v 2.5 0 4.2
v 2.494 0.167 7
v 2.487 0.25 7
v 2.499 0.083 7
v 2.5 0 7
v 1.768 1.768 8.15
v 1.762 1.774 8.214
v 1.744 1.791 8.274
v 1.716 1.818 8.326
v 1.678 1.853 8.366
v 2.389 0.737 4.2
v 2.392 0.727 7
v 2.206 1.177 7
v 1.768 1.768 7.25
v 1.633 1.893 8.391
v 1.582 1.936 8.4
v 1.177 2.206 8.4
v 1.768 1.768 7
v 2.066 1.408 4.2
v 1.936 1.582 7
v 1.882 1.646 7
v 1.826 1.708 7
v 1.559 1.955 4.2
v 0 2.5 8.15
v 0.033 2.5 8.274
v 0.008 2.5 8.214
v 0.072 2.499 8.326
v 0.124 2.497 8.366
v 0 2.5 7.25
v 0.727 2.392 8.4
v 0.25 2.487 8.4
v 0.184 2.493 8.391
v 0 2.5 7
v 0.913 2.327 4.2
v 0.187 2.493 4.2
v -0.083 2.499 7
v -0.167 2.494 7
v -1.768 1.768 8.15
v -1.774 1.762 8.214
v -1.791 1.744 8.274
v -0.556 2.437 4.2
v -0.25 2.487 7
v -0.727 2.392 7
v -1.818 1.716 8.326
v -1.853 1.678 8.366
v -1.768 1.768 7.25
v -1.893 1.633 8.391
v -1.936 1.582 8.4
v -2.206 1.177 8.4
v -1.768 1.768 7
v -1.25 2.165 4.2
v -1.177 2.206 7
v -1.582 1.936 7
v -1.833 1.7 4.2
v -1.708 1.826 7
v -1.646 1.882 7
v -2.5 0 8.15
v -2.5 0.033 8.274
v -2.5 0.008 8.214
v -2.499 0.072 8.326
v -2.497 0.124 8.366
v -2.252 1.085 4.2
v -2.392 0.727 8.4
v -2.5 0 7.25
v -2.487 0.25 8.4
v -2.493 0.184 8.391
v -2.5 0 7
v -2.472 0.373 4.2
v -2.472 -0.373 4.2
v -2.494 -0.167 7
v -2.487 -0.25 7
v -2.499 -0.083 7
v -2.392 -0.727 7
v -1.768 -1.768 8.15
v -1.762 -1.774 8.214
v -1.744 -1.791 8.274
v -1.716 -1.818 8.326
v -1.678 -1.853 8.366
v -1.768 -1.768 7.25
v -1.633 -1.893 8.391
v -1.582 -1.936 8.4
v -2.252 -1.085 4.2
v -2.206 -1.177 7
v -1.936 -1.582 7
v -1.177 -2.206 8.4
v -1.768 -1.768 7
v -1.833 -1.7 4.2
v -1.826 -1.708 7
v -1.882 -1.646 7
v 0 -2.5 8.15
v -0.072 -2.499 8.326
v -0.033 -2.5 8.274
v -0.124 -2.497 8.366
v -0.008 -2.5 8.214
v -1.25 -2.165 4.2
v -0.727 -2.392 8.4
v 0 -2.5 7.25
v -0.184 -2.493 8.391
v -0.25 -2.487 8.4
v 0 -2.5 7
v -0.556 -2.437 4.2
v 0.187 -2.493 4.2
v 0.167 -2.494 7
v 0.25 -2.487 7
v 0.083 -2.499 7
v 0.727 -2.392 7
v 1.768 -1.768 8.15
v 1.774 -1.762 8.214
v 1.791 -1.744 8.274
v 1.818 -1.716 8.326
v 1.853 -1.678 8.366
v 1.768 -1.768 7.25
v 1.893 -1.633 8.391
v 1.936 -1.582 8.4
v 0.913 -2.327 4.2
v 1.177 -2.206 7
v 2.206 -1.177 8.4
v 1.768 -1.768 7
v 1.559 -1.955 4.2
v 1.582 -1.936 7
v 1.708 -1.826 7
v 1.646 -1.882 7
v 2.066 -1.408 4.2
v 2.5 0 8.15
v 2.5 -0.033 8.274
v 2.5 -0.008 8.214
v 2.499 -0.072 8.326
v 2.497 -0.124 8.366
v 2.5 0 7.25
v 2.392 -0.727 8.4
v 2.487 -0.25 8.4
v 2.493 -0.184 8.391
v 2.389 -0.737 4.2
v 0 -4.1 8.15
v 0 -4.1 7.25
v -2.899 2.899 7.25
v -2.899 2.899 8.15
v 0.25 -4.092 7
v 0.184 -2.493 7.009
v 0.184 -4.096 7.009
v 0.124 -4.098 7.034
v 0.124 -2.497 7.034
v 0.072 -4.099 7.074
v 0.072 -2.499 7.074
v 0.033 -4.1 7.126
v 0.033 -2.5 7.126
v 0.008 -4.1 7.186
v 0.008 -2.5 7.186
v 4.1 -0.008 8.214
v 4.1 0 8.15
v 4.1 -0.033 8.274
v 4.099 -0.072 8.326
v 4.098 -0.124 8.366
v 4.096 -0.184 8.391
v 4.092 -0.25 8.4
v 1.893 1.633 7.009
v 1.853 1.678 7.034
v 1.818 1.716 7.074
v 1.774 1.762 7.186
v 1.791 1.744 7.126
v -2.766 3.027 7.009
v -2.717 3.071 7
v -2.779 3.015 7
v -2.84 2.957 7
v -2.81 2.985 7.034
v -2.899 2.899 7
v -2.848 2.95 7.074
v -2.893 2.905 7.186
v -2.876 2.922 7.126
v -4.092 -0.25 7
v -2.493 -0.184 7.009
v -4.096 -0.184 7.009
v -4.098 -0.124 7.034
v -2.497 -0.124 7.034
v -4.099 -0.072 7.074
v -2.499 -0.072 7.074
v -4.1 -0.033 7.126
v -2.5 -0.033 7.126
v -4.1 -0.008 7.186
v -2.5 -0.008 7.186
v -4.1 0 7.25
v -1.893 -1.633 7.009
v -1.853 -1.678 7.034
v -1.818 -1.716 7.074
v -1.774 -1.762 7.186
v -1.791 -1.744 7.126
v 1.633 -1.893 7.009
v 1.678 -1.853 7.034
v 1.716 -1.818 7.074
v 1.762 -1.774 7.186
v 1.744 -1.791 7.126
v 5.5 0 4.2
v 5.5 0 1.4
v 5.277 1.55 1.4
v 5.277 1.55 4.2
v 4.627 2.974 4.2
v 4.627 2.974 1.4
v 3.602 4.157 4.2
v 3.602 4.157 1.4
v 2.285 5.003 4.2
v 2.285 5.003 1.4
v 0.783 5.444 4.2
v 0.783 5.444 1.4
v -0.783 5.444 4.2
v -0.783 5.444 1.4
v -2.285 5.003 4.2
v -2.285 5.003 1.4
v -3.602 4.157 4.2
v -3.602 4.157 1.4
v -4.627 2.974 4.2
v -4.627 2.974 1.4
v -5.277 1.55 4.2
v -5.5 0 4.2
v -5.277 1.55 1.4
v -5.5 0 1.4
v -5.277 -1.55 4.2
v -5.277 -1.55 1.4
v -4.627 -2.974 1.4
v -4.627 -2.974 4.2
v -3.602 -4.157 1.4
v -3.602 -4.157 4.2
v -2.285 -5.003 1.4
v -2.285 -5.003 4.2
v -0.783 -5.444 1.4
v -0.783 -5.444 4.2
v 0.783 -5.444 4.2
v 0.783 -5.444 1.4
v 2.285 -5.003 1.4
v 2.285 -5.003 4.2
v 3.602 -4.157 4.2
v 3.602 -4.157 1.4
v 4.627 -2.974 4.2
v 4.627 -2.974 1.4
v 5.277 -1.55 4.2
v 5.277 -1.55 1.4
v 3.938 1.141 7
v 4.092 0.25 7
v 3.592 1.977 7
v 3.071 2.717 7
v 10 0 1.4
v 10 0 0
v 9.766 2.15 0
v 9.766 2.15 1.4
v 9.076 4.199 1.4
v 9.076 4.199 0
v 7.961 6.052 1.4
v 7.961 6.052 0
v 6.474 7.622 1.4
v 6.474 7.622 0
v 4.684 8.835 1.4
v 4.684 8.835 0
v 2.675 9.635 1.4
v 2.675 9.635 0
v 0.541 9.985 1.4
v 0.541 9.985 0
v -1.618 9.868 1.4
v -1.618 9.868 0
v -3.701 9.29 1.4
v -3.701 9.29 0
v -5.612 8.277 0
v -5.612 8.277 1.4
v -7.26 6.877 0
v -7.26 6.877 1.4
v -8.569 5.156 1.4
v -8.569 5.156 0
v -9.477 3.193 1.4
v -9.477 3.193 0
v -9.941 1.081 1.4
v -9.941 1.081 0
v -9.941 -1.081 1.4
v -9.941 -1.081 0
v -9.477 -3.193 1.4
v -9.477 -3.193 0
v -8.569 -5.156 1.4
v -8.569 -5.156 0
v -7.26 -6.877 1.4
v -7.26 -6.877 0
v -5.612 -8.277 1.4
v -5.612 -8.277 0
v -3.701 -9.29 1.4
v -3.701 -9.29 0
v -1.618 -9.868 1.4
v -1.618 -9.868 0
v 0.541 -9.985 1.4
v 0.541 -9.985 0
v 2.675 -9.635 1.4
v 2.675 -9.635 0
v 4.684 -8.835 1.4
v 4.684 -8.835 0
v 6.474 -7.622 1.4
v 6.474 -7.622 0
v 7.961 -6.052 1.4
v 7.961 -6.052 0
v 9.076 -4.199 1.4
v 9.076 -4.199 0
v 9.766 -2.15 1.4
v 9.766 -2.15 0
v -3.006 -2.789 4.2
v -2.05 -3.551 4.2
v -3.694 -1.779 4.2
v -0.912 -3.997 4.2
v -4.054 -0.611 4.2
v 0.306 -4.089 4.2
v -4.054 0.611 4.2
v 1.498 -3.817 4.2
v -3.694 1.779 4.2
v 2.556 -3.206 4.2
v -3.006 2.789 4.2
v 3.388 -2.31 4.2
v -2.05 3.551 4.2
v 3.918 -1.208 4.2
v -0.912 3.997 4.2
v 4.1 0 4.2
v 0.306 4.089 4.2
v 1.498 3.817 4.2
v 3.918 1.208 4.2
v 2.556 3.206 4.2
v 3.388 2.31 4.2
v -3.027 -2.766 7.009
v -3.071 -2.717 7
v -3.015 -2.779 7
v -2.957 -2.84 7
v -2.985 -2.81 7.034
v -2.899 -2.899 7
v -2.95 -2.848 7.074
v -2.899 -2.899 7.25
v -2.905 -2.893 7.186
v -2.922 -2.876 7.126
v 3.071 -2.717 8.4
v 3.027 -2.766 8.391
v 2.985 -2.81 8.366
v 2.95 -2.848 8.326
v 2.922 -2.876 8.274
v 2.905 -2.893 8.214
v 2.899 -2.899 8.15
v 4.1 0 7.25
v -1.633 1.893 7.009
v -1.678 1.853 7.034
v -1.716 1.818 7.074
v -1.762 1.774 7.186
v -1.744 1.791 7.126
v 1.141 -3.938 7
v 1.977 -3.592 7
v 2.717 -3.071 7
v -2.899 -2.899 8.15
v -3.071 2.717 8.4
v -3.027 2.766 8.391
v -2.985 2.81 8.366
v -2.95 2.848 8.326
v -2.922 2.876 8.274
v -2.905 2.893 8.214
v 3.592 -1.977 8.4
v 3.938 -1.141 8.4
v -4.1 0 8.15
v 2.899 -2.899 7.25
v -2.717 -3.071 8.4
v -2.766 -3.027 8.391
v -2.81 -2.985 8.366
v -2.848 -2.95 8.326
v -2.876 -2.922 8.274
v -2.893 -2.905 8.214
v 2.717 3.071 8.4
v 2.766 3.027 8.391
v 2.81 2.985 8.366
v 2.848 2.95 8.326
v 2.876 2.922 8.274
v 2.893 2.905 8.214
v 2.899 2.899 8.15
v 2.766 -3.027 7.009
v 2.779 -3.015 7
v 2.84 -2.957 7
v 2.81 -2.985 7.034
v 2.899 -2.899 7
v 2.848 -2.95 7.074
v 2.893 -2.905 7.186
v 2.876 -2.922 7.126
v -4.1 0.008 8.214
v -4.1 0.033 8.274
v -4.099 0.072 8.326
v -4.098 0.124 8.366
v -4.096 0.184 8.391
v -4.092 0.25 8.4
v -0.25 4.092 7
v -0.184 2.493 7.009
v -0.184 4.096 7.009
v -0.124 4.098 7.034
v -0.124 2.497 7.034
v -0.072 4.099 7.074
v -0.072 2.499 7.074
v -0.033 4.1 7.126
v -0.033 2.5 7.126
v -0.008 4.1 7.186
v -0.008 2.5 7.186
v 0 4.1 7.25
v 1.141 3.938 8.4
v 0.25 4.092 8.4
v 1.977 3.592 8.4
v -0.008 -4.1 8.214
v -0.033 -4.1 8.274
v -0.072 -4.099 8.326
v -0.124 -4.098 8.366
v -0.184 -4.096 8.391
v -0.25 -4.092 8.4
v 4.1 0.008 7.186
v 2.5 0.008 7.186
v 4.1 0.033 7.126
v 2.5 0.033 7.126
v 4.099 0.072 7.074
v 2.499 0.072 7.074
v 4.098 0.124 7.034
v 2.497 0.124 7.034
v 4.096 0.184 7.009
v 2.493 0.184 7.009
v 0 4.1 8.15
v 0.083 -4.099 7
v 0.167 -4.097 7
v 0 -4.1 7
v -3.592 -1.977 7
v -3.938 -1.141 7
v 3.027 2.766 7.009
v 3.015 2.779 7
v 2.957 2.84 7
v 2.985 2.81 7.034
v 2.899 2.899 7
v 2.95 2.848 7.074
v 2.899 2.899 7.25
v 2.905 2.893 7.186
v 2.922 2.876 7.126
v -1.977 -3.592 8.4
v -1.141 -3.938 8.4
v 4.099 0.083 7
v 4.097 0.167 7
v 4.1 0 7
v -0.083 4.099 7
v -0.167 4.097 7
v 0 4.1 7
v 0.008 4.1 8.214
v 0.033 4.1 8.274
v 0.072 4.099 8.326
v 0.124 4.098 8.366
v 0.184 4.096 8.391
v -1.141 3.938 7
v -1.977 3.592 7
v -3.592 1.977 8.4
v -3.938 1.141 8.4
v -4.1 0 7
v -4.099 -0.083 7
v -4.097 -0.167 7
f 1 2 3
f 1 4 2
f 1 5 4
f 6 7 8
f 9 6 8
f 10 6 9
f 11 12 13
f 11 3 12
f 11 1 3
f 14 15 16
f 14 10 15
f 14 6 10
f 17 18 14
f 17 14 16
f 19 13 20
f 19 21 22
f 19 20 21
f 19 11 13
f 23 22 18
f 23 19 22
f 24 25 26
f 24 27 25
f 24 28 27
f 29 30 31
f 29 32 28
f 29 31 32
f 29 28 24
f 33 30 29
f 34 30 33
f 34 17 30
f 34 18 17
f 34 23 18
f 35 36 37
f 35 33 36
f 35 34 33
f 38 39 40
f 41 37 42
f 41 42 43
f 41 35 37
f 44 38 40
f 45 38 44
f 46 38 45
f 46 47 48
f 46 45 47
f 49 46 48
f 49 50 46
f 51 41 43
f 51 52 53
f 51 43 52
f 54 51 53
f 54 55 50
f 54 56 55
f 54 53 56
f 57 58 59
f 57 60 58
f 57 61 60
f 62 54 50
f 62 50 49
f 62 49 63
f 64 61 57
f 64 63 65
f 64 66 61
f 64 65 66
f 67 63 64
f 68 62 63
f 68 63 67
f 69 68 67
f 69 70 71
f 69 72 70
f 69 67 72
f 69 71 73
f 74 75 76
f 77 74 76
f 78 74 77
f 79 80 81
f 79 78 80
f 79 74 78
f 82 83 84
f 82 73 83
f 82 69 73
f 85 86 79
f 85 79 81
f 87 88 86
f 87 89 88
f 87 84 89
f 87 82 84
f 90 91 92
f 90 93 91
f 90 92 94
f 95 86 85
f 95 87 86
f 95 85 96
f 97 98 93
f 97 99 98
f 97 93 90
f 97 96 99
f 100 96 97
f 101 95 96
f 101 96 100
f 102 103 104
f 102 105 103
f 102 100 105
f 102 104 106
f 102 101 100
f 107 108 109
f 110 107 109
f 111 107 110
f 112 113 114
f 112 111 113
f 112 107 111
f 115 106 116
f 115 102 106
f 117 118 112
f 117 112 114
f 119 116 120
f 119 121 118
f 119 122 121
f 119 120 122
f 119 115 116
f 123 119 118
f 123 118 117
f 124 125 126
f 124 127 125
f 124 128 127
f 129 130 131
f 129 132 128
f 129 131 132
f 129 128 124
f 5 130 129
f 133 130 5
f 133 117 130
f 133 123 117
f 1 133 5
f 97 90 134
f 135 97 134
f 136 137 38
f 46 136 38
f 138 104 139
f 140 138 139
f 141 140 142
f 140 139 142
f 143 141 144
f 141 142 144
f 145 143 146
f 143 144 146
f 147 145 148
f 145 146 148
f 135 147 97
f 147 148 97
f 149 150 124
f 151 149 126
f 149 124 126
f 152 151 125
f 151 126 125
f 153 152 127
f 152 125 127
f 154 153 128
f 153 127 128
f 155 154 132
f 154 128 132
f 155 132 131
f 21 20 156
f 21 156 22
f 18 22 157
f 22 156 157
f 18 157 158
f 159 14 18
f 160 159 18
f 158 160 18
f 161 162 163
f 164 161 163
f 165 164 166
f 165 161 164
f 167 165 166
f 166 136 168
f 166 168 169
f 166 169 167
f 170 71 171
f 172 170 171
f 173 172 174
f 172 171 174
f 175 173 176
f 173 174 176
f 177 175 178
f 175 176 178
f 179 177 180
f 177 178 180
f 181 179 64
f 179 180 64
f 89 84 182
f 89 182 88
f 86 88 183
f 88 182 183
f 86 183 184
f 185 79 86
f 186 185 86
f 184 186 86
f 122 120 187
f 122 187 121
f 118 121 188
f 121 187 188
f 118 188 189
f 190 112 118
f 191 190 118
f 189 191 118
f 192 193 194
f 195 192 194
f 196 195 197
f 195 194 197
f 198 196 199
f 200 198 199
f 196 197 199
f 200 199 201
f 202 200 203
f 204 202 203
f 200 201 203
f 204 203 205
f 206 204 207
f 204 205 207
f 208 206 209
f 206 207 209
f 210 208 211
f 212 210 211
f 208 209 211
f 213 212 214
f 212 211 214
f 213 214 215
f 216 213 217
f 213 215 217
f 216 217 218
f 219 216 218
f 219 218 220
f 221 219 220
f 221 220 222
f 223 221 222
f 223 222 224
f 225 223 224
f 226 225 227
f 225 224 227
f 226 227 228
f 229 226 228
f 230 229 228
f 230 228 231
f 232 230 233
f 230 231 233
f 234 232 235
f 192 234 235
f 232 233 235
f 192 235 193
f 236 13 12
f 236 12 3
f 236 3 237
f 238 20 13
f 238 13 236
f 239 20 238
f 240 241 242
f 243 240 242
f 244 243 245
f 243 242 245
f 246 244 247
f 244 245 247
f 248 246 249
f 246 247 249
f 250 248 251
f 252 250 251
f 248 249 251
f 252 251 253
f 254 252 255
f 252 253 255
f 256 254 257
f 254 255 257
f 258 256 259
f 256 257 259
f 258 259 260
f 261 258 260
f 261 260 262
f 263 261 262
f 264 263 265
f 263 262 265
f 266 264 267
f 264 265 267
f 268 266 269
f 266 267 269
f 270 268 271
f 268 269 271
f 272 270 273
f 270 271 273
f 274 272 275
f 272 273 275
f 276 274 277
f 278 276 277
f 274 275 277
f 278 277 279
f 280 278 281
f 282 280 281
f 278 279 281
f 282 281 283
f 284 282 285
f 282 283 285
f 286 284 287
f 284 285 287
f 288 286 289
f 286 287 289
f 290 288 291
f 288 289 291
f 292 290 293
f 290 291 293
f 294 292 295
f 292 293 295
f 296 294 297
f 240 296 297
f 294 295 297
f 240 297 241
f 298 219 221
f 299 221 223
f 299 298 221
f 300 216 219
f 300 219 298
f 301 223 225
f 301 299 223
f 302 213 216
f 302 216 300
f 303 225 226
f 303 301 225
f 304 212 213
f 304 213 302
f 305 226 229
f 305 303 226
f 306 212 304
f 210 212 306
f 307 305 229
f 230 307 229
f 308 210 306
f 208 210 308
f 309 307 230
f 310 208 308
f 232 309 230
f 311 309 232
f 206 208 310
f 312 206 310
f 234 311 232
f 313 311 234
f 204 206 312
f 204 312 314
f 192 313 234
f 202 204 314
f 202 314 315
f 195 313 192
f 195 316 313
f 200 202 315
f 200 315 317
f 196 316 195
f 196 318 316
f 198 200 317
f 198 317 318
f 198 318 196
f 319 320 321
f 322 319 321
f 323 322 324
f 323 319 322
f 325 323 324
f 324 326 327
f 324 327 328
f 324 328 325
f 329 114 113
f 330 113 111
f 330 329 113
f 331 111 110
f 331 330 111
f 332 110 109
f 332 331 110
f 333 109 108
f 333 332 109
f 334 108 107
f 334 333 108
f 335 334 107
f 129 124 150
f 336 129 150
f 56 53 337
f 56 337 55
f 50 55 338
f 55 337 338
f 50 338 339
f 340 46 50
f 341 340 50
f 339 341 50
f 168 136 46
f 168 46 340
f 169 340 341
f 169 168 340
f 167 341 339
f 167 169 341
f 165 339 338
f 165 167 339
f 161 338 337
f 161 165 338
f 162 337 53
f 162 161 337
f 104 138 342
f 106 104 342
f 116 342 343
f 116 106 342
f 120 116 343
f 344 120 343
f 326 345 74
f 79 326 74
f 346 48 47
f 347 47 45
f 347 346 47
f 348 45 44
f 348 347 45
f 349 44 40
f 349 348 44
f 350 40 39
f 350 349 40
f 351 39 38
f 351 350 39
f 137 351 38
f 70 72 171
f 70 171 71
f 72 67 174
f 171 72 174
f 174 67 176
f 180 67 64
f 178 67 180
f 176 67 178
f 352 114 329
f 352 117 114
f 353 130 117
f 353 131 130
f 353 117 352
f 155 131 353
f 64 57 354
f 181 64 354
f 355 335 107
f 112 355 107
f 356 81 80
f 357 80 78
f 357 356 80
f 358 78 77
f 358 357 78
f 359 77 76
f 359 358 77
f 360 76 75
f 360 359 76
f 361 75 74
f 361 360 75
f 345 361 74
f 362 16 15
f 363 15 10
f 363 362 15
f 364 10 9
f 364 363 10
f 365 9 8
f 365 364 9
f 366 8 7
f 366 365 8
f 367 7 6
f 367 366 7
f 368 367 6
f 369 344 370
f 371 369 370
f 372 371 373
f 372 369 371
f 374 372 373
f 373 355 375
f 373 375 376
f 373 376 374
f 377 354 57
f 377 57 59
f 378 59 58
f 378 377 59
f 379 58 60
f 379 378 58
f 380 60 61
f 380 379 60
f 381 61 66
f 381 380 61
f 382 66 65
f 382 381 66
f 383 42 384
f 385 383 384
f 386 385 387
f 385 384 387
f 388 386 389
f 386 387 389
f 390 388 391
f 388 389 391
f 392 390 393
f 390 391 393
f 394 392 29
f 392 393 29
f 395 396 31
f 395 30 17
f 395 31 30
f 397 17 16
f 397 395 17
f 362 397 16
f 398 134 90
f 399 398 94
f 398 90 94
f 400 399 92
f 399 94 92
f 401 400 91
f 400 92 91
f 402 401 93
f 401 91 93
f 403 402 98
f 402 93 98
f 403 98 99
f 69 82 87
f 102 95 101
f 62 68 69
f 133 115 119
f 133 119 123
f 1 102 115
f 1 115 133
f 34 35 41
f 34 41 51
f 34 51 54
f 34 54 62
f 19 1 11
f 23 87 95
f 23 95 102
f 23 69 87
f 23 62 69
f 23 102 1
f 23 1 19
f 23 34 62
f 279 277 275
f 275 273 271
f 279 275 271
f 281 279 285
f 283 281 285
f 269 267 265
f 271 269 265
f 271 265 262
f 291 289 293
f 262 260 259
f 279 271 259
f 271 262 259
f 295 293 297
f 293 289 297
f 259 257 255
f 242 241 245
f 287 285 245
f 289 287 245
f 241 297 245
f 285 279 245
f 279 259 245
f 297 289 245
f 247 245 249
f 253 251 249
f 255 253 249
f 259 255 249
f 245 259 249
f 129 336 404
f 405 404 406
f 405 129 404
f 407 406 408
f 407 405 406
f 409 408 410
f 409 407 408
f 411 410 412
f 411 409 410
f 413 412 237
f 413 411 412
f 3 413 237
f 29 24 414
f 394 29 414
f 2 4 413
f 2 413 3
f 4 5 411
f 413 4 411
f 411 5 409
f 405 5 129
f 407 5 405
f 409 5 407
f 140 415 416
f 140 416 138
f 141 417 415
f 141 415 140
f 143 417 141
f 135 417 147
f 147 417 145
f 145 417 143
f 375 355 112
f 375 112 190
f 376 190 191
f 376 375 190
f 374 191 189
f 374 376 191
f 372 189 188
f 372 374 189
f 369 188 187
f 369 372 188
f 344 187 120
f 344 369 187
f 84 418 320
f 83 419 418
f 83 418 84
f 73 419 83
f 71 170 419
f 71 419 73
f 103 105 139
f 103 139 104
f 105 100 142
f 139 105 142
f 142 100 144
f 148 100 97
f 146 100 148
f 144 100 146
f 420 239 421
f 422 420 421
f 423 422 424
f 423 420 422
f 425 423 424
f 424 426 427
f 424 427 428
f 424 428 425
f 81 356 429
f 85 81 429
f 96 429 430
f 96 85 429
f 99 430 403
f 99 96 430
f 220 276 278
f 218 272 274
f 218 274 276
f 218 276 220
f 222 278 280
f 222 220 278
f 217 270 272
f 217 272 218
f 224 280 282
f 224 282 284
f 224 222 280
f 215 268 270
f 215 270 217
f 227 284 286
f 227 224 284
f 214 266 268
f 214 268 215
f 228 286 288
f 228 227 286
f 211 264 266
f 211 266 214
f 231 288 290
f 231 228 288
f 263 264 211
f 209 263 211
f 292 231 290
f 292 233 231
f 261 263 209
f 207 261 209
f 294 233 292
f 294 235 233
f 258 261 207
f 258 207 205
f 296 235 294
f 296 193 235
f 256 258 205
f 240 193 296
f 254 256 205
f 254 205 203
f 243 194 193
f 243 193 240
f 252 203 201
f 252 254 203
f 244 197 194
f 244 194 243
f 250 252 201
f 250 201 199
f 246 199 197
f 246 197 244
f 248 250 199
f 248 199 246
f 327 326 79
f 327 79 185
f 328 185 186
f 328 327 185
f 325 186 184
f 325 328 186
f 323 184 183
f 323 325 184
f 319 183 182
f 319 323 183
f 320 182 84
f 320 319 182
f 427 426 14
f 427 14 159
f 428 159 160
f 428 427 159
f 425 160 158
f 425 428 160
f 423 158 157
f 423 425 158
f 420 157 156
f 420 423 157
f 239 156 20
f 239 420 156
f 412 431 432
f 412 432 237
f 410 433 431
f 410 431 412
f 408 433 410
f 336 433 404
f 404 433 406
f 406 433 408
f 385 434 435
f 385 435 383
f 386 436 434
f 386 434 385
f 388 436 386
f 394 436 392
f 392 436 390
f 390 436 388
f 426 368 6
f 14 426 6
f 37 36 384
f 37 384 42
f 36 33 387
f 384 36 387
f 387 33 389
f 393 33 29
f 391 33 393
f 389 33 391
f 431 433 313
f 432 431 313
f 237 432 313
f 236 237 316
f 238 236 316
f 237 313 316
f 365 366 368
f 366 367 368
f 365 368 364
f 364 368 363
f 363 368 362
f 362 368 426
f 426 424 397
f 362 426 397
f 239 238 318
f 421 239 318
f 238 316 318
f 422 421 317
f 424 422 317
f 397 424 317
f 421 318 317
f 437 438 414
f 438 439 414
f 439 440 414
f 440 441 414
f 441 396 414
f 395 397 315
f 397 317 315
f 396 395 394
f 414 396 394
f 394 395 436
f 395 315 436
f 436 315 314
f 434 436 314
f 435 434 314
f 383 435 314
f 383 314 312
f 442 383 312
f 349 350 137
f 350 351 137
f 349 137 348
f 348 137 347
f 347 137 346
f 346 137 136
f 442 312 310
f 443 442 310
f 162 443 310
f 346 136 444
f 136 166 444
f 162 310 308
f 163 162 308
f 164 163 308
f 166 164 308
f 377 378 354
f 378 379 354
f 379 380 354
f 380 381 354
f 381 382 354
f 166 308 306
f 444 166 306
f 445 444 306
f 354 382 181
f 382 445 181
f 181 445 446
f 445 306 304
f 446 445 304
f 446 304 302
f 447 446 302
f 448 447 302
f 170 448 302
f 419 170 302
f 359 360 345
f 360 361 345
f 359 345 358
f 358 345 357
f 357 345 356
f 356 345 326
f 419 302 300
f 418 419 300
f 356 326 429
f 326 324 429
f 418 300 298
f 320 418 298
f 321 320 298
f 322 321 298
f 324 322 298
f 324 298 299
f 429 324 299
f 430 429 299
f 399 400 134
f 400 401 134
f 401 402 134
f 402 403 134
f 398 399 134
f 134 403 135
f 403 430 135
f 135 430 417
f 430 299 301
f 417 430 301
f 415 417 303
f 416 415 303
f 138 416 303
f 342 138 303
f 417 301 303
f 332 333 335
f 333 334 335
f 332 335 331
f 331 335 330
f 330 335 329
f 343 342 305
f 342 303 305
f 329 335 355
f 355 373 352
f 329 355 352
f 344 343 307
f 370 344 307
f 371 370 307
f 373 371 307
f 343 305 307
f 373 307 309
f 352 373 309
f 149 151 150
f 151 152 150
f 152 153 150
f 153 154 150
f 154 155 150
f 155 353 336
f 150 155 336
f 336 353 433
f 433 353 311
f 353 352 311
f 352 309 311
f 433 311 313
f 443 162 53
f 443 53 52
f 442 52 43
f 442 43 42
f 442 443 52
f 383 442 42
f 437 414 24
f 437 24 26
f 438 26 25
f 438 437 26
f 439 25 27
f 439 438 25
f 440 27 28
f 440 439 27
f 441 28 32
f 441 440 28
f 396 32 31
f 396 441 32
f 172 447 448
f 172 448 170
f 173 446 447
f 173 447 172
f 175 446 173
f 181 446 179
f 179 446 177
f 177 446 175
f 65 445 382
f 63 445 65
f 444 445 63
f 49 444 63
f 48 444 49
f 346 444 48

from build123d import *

# Parameters (mm, degrees)
F0_R         = 10
F1_DEPTH     = 1.4
F2_R         = 5.5
F3_DEPTH     = 2.8
F4_R         = 4.1
F4_R_2       = 2.5
F5_DEPTH     = 4.2
F7_DEPTH     = 1.4
F8_T4_DEPTH  = 2.85
F8_S5_R      = 4.1
F8_T6_DEPTH  = 3
F8_S7_R      = 2.5
F8_T8_DEPTH  = 3
F8_T12_DEPTH = 2.85
F8_S13_R     = 4.1
F8_T14_DEPTH = 3
F8_S15_R     = 2.5
F8_T16_DEPTH = 3
F8_T20_DEPTH = 2.85
F8_S21_R     = 4.1
F8_T22_DEPTH = 3
F8_S23_R     = 2.5
F8_T24_DEPTH = 3
F8_T28_DEPTH = 2.85
F8_S29_R     = 4.1
F8_T30_DEPTH = 3
F8_S31_R     = 2.5
F8_T32_DEPTH = 3
F8_T36_DEPTH = 2.85
F8_S37_R     = 4.1
F8_T38_DEPTH = 3
F8_S39_R     = 2.5
F8_T40_DEPTH = 3
F8_T44_DEPTH = 2.85
F8_S45_R     = 4.1
F8_T46_DEPTH = 3
F8_S47_R     = 2.5
F8_T48_DEPTH = 3
F8_T52_DEPTH = 2.85
F8_S53_R     = 4.1
F8_T54_DEPTH = 3
F8_S55_R     = 2.5
F8_T56_DEPTH = 3
F8_T60_DEPTH = 2.85
F8_S61_R     = 4.1
F8_T62_DEPTH = 3
F8_S63_R     = 2.5
F8_T64_DEPTH = 3
F8_T65_DEPTH = 2.85
F8_T67_DEPTH = 2.85
F8_T69_DEPTH = 2.85
F8_T71_DEPTH = 2.85
F8_T73_DEPTH = 2.85
F8_T75_DEPTH = 2.85
F8_T77_DEPTH = 2.85
F8_T79_DEPTH = 2.85


# Not quite as in the source:
# - a fillet or chamfer that OpenCascade refuses, or shapes differently, is made with other operations: its cross-section is extruded or revolved along the edge and cut away or added


with BuildPart() as f1:
    # F0 (on Top) → F1 (new body)
    with BuildSketch(Plane.XY):
        Circle(F0_R)
    extrude(amount=F1_DEPTH)

    # F2 (on face) → F3 (join)
    with BuildSketch(Plane.XY.offset(1.4)):
        Circle(F2_R)
    extrude(amount=F3_DEPTH)

    # F4 (on face) → F5 (join)
    with BuildSketch(Plane.XY.offset(4.2)):
        Circle(F4_R)
        Circle(F4_R_2, mode=Mode.SUBTRACT)
    extrude(amount=F5_DEPTH)

    # F6 (on face) → F7 (cut)
    with BuildSketch(Plane.XY.offset(8.4)):
        with BuildLine():
            Line((0, -2.5), (0, -4.1))
            ThreePointArc((0, -4.1), (1.5690020727, -3.7879060833), (2.8991378029, -2.8991378029))
            Line((2.8991378029, -2.8991378029), (1.767766953, -1.767766953))
            ThreePointArc((1.767766953, -1.767766953), (0.9567085809, -2.3096988313), (0, -2.5))
        make_face()
        with BuildLine():
            ThreePointArc((-4.1, 0), (-3.7879060833, -1.5690020727), (-2.8991378029, -2.8991378029))
            Line((-2.8991378029, -2.8991378029), (-1.767766953, -1.767766953))
            ThreePointArc((-1.767766953, -1.767766953), (-2.3096988313, -0.9567085809), (-2.5, 0))
            Line((-2.5, 0), (-4.1, 0))
        make_face()
        with BuildLine():
            Line((2.5, 0), (4.1, 0))
            ThreePointArc((4.1, 0), (3.7879060833, 1.5690020727), (2.8991378029, 2.8991378029))
            Line((2.8991378029, 2.8991378029), (1.767766953, 1.767766953))
            ThreePointArc((1.767766953, 1.767766953), (2.3096988313, 0.9567085809), (2.5, 0))
        make_face()
        with BuildLine():
            ThreePointArc((-1.767766953, 1.767766953), (-0.9567085809, 2.3096988313), (0, 2.5))
            Line((0, 2.5), (0, 4.1))
            ThreePointArc((0, 4.1), (-1.5690020727, 3.7879060833), (-2.8991378029, 2.8991378029))
            Line((-2.8991378029, 2.8991378029), (-1.767766953, 1.767766953))
        make_face()
    extrude(amount=-F7_DEPTH, mode=Mode.SUBTRACT)

    # F8: fillet of radius 0.25 on 16 edges, made by hand


with BuildPart() as f8_tool2:
    # F8_s3 → F8_t4 (new body)
    with BuildSketch(Plane.YZ.offset(-1.875)):
        with BuildLine():
            ThreePointArc((-0.25, 7), (-0.0732233047, 7.0732233047), (0, 7.25))
            Line((0, 7.25), (0, 7))
            Line((0, 7), (-0.25, 7))
        make_face()
    extrude(amount=-F8_T4_DEPTH)

    # F8_s5 → F8_t6 (intersect, symmetric)
    with BuildSketch(Plane.XY.offset(7.1)):
        Circle(F8_S5_R)
    extrude(amount=F8_T6_DEPTH, both=True, mode=Mode.INTERSECT)

    # F8_s7 → F8_t8 (cut, symmetric)
    with BuildSketch(Plane.XY.offset(7.1)):
        Circle(F8_S7_R)
    extrude(amount=F8_T8_DEPTH, both=True, mode=Mode.SUBTRACT)


with BuildPart() as f1_1:
    add(f1.part)

    # F8_t1: union F8_tool2
    add(f8_tool2.part)


with BuildPart() as f8_tool10:
    # F8_s11 → F8_t12 (new body)
    with BuildSketch(Plane.XZ.offset(-1.875)):
        with BuildLine():
            ThreePointArc((-0.25, 7), (-0.0732233047, 7.0732233047), (0, 7.25))
            Line((0, 7.25), (0, 7))
            Line((0, 7), (-0.25, 7))
        make_face()
    extrude(amount=-F8_T12_DEPTH)

    # F8_s13 → F8_t14 (intersect, symmetric)
    with BuildSketch(Plane.XY.offset(7.1)):
        Circle(F8_S13_R)
    extrude(amount=F8_T14_DEPTH, both=True, mode=Mode.INTERSECT)

    # F8_s15 → F8_t16 (cut, symmetric)
    with BuildSketch(Plane.XY.offset(7.1)):
        Circle(F8_S15_R)
    extrude(amount=F8_T16_DEPTH, both=True, mode=Mode.SUBTRACT)


with BuildPart() as f1_2:
    add(f1_1.part)

    # F8_t9: union F8_tool10
    add(f8_tool10.part)


with BuildPart() as f8_tool18:
    # F8_s19 → F8_t20 (new body)
    with BuildSketch(Plane(origin=(3.3410795411, -3.3410795411, 0), x_dir=(0, 0, 1), z_dir=(-0.7071067812, 0.7071067812, 0))):
        with BuildLine():
            ThreePointArc((7.25, 0), (7.0732233047, -0.0732233047), (7, -0.25))
            Line((7, -0.25), (7, 0))
            Line((7, 0), (7.25, 0))
        make_face()
    extrude(amount=F8_T20_DEPTH)

    # F8_s21 → F8_t22 (intersect, symmetric)
    with BuildSketch(Plane.XY.offset(7.1)):
        Circle(F8_S21_R)
    extrude(amount=F8_T22_DEPTH, both=True, mode=Mode.INTERSECT)

    # F8_s23 → F8_t24 (cut, symmetric)
    with BuildSketch(Plane.XY.offset(7.1)):
        Circle(F8_S23_R)
    extrude(amount=F8_T24_DEPTH, both=True, mode=Mode.SUBTRACT)


with BuildPart() as f1_3:
    add(f1_2.part)

    # F8_t17: union F8_tool18
    add(f8_tool18.part)


with BuildPart() as f8_tool26:
    # F8_s27 → F8_t28 (new body)
    with BuildSketch(Plane.YZ.offset(1.875)):
        with BuildLine():
            ThreePointArc((0, 7.25), (0.0732233047, 7.0732233047), (0.25, 7))
            Line((0.25, 7), (0, 7))
            Line((0, 7), (0, 7.25))
        make_face()
    extrude(amount=F8_T28_DEPTH)

    # F8_s29 → F8_t30 (intersect, symmetric)
    with BuildSketch(Plane.XY.offset(7.1)):
        Circle(F8_S29_R)
    extrude(amount=F8_T30_DEPTH, both=True, mode=Mode.INTERSECT)

    # F8_s31 → F8_t32 (cut, symmetric)
    with BuildSketch(Plane.XY.offset(7.1)):
        Circle(F8_S31_R)
    extrude(amount=F8_T32_DEPTH, both=True, mode=Mode.SUBTRACT)


with BuildPart() as f1_4:
    add(f1_3.part)

    # F8_t25: union F8_tool26
    add(f8_tool26.part)


with BuildPart() as f8_tool34:
    # F8_s35 → F8_t36 (new body)
    with BuildSketch(Plane(origin=(-3.3410795411, -3.3410795411, 0), x_dir=(0, 0, 1), z_dir=(0.7071067812, 0.7071067812, 0))):
        with BuildLine():
            ThreePointArc((7.25, 0), (7.0732233047, -0.0732233047), (7, -0.25))
            Line((7, -0.25), (7, 0))
            Line((7, 0), (7.25, 0))
        make_face()
    extrude(amount=F8_T36_DEPTH)

    # F8_s37 → F8_t38 (intersect, symmetric)
    with BuildSketch(Plane.XY.offset(7.1)):
        Circle(F8_S37_R)
    extrude(amount=F8_T38_DEPTH, both=True, mode=Mode.INTERSECT)

    # F8_s39 → F8_t40 (cut, symmetric)
    with BuildSketch(Plane.XY.offset(7.1)):
        Circle(F8_S39_R)
    extrude(amount=F8_T40_DEPTH, both=True, mode=Mode.SUBTRACT)


with BuildPart() as f1_5:
    add(f1_4.part)

    # F8_t33: union F8_tool34
    add(f8_tool34.part)


with BuildPart() as f8_tool42:
    # F8_s43 → F8_t44 (new body)
    with BuildSketch(Plane(origin=(-3.3410795411, 3.3410795411, 0), x_dir=(0, 0, 1), z_dir=(0.7071067812, -0.7071067812, 0))):
        with BuildLine():
            ThreePointArc((7.25, 0), (7.0732233047, -0.0732233047), (7, -0.25))
            Line((7, -0.25), (7, 0))
            Line((7, 0), (7.25, 0))
        make_face()
    extrude(amount=F8_T44_DEPTH)

    # F8_s45 → F8_t46 (intersect, symmetric)
    with BuildSketch(Plane.XY.offset(7.1)):
        Circle(F8_S45_R)
    extrude(amount=F8_T46_DEPTH, both=True, mode=Mode.INTERSECT)

    # F8_s47 → F8_t48 (cut, symmetric)
    with BuildSketch(Plane.XY.offset(7.1)):
        Circle(F8_S47_R)
    extrude(amount=F8_T48_DEPTH, both=True, mode=Mode.SUBTRACT)


with BuildPart() as f1_6:
    add(f1_5.part)

    # F8_t41: union F8_tool42
    add(f8_tool42.part)


with BuildPart() as f8_tool50:
    # F8_s51 → F8_t52 (new body)
    with BuildSketch(Plane.XZ.offset(1.875)):
        with BuildLine():
            ThreePointArc((0.25, 7), (0.0732233047, 7.0732233047), (0, 7.25))
            Line((0, 7.25), (0, 7))
            Line((0, 7), (0.25, 7))
        make_face()
    extrude(amount=F8_T52_DEPTH)

    # F8_s53 → F8_t54 (intersect, symmetric)
    with BuildSketch(Plane.XY.offset(7.1)):
        Circle(F8_S53_R)
    extrude(amount=F8_T54_DEPTH, both=True, mode=Mode.INTERSECT)

    # F8_s55 → F8_t56 (cut, symmetric)
    with BuildSketch(Plane.XY.offset(7.1)):
        Circle(F8_S55_R)
    extrude(amount=F8_T56_DEPTH, both=True, mode=Mode.SUBTRACT)


with BuildPart() as f1_7:
    add(f1_6.part)

    # F8_t49: union F8_tool50
    add(f8_tool50.part)


with BuildPart() as f8_tool58:
    # F8_s59 → F8_t60 (new body)
    with BuildSketch(Plane(origin=(3.3410795411, 3.3410795411, 0), x_dir=(0, 0, 1), z_dir=(-0.7071067812, -0.7071067812, 0))):
        with BuildLine():
            ThreePointArc((7.25, 0), (7.0732233047, -0.0732233047), (7, -0.25))
            Line((7, -0.25), (7, 0))
            Line((7, 0), (7.25, 0))
        make_face()
    extrude(amount=F8_T60_DEPTH)

    # F8_s61 → F8_t62 (intersect, symmetric)
    with BuildSketch(Plane.XY.offset(7.1)):
        Circle(F8_S61_R)
    extrude(amount=F8_T62_DEPTH, both=True, mode=Mode.INTERSECT)

    # F8_s63 → F8_t64 (cut, symmetric)
    with BuildSketch(Plane.XY.offset(7.1)):
        Circle(F8_S63_R)
    extrude(amount=F8_T64_DEPTH, both=True, mode=Mode.SUBTRACT)


with BuildPart() as f1_8:
    add(f1_7.part)

    # F8_t57: union F8_tool58
    add(f8_tool58.part)

    # F8_s66 → F8_t65 (cut)
    with BuildSketch(Plane.YZ.offset(-4.725)):
        with BuildLine():
            ThreePointArc((0, 8.15), (0.0732233047, 8.3267766953), (0.25, 8.4))
            Line((0.25, 8.4), (0, 8.4))
            Line((0, 8.4), (0, 8.15))
        make_face()
    extrude(amount=F8_T65_DEPTH, mode=Mode.SUBTRACT)

    # F8_s68 → F8_t67 (cut)
    with BuildSketch(Plane(origin=(-3.3410795411, 3.3410795411, 0), x_dir=(0, 0, 1), z_dir=(0.7071067812, -0.7071067812, 0))):
        with BuildLine():
            ThreePointArc((8.4, 0.25), (8.3267766953, 0.0732233047), (8.15, 0))
            Line((8.15, 0), (8.4, 0))
            Line((8.4, 0), (8.4, 0.25))
        make_face()
    extrude(amount=F8_T67_DEPTH, mode=Mode.SUBTRACT)

    # F8_s70 → F8_t69 (cut)
    with BuildSketch(Plane.XZ.offset(1.875)):
        with BuildLine():
            ThreePointArc((0, 8.15), (-0.0732233047, 8.3267766953), (-0.25, 8.4))
            Line((-0.25, 8.4), (0, 8.4))
            Line((0, 8.4), (0, 8.15))
        make_face()
    extrude(amount=F8_T69_DEPTH, mode=Mode.SUBTRACT)

    # F8_s72 → F8_t71 (cut)
    with BuildSketch(Plane(origin=(-3.3410795411, -3.3410795411, 0), x_dir=(0, 0, 1), z_dir=(0.7071067812, 0.7071067812, 0))):
        with BuildLine():
            ThreePointArc((8.4, 0.25), (8.3267766953, 0.0732233047), (8.15, 0))
            Line((8.15, 0), (8.4, 0))
            Line((8.4, 0), (8.4, 0.25))
        make_face()
    extrude(amount=F8_T71_DEPTH, mode=Mode.SUBTRACT)

    # F8_s74 → F8_t73 (cut)
    with BuildSketch(Plane.YZ.offset(1.875)):
        with BuildLine():
            ThreePointArc((0, 8.15), (-0.0732233047, 8.3267766953), (-0.25, 8.4))
            Line((-0.25, 8.4), (0, 8.4))
            Line((0, 8.4), (0, 8.15))
        make_face()
    extrude(amount=F8_T73_DEPTH, mode=Mode.SUBTRACT)

    # F8_s76 → F8_t75 (cut)
    with BuildSketch(Plane(origin=(3.3410795411, -3.3410795411, 0), x_dir=(0, 0, 1), z_dir=(-0.7071067812, 0.7071067812, 0))):
        with BuildLine():
            ThreePointArc((8.4, 0.25), (8.3267766953, 0.0732233047), (8.15, 0))
            Line((8.15, 0), (8.4, 0))
            Line((8.4, 0), (8.4, 0.25))
        make_face()
    extrude(amount=F8_T75_DEPTH, mode=Mode.SUBTRACT)

    # F8_s78 → F8_t77 (cut)
    with BuildSketch(Plane.XZ.offset(-4.725)):
        with BuildLine():
            ThreePointArc((0, 8.15), (0.0732233047, 8.3267766953), (0.25, 8.4))
            Line((0.25, 8.4), (0, 8.4))
            Line((0, 8.4), (0, 8.15))
        make_face()
    extrude(amount=F8_T77_DEPTH, mode=Mode.SUBTRACT)

    # F8_s80 → F8_t79 (cut)
    with BuildSketch(Plane(origin=(3.3410795411, 3.3410795411, 0), x_dir=(0, 0, 1), z_dir=(-0.7071067812, -0.7071067812, 0))):
        with BuildLine():
            ThreePointArc((8.4, 0.25), (8.3267766953, 0.0732233047), (8.15, 0))
            Line((8.15, 0), (8.4, 0))
            Line((8.4, 0), (8.4, 0.25))
        make_face()
    extrude(amount=F8_T79_DEPTH, mode=Mode.SUBTRACT)


solid = f1_8.part
